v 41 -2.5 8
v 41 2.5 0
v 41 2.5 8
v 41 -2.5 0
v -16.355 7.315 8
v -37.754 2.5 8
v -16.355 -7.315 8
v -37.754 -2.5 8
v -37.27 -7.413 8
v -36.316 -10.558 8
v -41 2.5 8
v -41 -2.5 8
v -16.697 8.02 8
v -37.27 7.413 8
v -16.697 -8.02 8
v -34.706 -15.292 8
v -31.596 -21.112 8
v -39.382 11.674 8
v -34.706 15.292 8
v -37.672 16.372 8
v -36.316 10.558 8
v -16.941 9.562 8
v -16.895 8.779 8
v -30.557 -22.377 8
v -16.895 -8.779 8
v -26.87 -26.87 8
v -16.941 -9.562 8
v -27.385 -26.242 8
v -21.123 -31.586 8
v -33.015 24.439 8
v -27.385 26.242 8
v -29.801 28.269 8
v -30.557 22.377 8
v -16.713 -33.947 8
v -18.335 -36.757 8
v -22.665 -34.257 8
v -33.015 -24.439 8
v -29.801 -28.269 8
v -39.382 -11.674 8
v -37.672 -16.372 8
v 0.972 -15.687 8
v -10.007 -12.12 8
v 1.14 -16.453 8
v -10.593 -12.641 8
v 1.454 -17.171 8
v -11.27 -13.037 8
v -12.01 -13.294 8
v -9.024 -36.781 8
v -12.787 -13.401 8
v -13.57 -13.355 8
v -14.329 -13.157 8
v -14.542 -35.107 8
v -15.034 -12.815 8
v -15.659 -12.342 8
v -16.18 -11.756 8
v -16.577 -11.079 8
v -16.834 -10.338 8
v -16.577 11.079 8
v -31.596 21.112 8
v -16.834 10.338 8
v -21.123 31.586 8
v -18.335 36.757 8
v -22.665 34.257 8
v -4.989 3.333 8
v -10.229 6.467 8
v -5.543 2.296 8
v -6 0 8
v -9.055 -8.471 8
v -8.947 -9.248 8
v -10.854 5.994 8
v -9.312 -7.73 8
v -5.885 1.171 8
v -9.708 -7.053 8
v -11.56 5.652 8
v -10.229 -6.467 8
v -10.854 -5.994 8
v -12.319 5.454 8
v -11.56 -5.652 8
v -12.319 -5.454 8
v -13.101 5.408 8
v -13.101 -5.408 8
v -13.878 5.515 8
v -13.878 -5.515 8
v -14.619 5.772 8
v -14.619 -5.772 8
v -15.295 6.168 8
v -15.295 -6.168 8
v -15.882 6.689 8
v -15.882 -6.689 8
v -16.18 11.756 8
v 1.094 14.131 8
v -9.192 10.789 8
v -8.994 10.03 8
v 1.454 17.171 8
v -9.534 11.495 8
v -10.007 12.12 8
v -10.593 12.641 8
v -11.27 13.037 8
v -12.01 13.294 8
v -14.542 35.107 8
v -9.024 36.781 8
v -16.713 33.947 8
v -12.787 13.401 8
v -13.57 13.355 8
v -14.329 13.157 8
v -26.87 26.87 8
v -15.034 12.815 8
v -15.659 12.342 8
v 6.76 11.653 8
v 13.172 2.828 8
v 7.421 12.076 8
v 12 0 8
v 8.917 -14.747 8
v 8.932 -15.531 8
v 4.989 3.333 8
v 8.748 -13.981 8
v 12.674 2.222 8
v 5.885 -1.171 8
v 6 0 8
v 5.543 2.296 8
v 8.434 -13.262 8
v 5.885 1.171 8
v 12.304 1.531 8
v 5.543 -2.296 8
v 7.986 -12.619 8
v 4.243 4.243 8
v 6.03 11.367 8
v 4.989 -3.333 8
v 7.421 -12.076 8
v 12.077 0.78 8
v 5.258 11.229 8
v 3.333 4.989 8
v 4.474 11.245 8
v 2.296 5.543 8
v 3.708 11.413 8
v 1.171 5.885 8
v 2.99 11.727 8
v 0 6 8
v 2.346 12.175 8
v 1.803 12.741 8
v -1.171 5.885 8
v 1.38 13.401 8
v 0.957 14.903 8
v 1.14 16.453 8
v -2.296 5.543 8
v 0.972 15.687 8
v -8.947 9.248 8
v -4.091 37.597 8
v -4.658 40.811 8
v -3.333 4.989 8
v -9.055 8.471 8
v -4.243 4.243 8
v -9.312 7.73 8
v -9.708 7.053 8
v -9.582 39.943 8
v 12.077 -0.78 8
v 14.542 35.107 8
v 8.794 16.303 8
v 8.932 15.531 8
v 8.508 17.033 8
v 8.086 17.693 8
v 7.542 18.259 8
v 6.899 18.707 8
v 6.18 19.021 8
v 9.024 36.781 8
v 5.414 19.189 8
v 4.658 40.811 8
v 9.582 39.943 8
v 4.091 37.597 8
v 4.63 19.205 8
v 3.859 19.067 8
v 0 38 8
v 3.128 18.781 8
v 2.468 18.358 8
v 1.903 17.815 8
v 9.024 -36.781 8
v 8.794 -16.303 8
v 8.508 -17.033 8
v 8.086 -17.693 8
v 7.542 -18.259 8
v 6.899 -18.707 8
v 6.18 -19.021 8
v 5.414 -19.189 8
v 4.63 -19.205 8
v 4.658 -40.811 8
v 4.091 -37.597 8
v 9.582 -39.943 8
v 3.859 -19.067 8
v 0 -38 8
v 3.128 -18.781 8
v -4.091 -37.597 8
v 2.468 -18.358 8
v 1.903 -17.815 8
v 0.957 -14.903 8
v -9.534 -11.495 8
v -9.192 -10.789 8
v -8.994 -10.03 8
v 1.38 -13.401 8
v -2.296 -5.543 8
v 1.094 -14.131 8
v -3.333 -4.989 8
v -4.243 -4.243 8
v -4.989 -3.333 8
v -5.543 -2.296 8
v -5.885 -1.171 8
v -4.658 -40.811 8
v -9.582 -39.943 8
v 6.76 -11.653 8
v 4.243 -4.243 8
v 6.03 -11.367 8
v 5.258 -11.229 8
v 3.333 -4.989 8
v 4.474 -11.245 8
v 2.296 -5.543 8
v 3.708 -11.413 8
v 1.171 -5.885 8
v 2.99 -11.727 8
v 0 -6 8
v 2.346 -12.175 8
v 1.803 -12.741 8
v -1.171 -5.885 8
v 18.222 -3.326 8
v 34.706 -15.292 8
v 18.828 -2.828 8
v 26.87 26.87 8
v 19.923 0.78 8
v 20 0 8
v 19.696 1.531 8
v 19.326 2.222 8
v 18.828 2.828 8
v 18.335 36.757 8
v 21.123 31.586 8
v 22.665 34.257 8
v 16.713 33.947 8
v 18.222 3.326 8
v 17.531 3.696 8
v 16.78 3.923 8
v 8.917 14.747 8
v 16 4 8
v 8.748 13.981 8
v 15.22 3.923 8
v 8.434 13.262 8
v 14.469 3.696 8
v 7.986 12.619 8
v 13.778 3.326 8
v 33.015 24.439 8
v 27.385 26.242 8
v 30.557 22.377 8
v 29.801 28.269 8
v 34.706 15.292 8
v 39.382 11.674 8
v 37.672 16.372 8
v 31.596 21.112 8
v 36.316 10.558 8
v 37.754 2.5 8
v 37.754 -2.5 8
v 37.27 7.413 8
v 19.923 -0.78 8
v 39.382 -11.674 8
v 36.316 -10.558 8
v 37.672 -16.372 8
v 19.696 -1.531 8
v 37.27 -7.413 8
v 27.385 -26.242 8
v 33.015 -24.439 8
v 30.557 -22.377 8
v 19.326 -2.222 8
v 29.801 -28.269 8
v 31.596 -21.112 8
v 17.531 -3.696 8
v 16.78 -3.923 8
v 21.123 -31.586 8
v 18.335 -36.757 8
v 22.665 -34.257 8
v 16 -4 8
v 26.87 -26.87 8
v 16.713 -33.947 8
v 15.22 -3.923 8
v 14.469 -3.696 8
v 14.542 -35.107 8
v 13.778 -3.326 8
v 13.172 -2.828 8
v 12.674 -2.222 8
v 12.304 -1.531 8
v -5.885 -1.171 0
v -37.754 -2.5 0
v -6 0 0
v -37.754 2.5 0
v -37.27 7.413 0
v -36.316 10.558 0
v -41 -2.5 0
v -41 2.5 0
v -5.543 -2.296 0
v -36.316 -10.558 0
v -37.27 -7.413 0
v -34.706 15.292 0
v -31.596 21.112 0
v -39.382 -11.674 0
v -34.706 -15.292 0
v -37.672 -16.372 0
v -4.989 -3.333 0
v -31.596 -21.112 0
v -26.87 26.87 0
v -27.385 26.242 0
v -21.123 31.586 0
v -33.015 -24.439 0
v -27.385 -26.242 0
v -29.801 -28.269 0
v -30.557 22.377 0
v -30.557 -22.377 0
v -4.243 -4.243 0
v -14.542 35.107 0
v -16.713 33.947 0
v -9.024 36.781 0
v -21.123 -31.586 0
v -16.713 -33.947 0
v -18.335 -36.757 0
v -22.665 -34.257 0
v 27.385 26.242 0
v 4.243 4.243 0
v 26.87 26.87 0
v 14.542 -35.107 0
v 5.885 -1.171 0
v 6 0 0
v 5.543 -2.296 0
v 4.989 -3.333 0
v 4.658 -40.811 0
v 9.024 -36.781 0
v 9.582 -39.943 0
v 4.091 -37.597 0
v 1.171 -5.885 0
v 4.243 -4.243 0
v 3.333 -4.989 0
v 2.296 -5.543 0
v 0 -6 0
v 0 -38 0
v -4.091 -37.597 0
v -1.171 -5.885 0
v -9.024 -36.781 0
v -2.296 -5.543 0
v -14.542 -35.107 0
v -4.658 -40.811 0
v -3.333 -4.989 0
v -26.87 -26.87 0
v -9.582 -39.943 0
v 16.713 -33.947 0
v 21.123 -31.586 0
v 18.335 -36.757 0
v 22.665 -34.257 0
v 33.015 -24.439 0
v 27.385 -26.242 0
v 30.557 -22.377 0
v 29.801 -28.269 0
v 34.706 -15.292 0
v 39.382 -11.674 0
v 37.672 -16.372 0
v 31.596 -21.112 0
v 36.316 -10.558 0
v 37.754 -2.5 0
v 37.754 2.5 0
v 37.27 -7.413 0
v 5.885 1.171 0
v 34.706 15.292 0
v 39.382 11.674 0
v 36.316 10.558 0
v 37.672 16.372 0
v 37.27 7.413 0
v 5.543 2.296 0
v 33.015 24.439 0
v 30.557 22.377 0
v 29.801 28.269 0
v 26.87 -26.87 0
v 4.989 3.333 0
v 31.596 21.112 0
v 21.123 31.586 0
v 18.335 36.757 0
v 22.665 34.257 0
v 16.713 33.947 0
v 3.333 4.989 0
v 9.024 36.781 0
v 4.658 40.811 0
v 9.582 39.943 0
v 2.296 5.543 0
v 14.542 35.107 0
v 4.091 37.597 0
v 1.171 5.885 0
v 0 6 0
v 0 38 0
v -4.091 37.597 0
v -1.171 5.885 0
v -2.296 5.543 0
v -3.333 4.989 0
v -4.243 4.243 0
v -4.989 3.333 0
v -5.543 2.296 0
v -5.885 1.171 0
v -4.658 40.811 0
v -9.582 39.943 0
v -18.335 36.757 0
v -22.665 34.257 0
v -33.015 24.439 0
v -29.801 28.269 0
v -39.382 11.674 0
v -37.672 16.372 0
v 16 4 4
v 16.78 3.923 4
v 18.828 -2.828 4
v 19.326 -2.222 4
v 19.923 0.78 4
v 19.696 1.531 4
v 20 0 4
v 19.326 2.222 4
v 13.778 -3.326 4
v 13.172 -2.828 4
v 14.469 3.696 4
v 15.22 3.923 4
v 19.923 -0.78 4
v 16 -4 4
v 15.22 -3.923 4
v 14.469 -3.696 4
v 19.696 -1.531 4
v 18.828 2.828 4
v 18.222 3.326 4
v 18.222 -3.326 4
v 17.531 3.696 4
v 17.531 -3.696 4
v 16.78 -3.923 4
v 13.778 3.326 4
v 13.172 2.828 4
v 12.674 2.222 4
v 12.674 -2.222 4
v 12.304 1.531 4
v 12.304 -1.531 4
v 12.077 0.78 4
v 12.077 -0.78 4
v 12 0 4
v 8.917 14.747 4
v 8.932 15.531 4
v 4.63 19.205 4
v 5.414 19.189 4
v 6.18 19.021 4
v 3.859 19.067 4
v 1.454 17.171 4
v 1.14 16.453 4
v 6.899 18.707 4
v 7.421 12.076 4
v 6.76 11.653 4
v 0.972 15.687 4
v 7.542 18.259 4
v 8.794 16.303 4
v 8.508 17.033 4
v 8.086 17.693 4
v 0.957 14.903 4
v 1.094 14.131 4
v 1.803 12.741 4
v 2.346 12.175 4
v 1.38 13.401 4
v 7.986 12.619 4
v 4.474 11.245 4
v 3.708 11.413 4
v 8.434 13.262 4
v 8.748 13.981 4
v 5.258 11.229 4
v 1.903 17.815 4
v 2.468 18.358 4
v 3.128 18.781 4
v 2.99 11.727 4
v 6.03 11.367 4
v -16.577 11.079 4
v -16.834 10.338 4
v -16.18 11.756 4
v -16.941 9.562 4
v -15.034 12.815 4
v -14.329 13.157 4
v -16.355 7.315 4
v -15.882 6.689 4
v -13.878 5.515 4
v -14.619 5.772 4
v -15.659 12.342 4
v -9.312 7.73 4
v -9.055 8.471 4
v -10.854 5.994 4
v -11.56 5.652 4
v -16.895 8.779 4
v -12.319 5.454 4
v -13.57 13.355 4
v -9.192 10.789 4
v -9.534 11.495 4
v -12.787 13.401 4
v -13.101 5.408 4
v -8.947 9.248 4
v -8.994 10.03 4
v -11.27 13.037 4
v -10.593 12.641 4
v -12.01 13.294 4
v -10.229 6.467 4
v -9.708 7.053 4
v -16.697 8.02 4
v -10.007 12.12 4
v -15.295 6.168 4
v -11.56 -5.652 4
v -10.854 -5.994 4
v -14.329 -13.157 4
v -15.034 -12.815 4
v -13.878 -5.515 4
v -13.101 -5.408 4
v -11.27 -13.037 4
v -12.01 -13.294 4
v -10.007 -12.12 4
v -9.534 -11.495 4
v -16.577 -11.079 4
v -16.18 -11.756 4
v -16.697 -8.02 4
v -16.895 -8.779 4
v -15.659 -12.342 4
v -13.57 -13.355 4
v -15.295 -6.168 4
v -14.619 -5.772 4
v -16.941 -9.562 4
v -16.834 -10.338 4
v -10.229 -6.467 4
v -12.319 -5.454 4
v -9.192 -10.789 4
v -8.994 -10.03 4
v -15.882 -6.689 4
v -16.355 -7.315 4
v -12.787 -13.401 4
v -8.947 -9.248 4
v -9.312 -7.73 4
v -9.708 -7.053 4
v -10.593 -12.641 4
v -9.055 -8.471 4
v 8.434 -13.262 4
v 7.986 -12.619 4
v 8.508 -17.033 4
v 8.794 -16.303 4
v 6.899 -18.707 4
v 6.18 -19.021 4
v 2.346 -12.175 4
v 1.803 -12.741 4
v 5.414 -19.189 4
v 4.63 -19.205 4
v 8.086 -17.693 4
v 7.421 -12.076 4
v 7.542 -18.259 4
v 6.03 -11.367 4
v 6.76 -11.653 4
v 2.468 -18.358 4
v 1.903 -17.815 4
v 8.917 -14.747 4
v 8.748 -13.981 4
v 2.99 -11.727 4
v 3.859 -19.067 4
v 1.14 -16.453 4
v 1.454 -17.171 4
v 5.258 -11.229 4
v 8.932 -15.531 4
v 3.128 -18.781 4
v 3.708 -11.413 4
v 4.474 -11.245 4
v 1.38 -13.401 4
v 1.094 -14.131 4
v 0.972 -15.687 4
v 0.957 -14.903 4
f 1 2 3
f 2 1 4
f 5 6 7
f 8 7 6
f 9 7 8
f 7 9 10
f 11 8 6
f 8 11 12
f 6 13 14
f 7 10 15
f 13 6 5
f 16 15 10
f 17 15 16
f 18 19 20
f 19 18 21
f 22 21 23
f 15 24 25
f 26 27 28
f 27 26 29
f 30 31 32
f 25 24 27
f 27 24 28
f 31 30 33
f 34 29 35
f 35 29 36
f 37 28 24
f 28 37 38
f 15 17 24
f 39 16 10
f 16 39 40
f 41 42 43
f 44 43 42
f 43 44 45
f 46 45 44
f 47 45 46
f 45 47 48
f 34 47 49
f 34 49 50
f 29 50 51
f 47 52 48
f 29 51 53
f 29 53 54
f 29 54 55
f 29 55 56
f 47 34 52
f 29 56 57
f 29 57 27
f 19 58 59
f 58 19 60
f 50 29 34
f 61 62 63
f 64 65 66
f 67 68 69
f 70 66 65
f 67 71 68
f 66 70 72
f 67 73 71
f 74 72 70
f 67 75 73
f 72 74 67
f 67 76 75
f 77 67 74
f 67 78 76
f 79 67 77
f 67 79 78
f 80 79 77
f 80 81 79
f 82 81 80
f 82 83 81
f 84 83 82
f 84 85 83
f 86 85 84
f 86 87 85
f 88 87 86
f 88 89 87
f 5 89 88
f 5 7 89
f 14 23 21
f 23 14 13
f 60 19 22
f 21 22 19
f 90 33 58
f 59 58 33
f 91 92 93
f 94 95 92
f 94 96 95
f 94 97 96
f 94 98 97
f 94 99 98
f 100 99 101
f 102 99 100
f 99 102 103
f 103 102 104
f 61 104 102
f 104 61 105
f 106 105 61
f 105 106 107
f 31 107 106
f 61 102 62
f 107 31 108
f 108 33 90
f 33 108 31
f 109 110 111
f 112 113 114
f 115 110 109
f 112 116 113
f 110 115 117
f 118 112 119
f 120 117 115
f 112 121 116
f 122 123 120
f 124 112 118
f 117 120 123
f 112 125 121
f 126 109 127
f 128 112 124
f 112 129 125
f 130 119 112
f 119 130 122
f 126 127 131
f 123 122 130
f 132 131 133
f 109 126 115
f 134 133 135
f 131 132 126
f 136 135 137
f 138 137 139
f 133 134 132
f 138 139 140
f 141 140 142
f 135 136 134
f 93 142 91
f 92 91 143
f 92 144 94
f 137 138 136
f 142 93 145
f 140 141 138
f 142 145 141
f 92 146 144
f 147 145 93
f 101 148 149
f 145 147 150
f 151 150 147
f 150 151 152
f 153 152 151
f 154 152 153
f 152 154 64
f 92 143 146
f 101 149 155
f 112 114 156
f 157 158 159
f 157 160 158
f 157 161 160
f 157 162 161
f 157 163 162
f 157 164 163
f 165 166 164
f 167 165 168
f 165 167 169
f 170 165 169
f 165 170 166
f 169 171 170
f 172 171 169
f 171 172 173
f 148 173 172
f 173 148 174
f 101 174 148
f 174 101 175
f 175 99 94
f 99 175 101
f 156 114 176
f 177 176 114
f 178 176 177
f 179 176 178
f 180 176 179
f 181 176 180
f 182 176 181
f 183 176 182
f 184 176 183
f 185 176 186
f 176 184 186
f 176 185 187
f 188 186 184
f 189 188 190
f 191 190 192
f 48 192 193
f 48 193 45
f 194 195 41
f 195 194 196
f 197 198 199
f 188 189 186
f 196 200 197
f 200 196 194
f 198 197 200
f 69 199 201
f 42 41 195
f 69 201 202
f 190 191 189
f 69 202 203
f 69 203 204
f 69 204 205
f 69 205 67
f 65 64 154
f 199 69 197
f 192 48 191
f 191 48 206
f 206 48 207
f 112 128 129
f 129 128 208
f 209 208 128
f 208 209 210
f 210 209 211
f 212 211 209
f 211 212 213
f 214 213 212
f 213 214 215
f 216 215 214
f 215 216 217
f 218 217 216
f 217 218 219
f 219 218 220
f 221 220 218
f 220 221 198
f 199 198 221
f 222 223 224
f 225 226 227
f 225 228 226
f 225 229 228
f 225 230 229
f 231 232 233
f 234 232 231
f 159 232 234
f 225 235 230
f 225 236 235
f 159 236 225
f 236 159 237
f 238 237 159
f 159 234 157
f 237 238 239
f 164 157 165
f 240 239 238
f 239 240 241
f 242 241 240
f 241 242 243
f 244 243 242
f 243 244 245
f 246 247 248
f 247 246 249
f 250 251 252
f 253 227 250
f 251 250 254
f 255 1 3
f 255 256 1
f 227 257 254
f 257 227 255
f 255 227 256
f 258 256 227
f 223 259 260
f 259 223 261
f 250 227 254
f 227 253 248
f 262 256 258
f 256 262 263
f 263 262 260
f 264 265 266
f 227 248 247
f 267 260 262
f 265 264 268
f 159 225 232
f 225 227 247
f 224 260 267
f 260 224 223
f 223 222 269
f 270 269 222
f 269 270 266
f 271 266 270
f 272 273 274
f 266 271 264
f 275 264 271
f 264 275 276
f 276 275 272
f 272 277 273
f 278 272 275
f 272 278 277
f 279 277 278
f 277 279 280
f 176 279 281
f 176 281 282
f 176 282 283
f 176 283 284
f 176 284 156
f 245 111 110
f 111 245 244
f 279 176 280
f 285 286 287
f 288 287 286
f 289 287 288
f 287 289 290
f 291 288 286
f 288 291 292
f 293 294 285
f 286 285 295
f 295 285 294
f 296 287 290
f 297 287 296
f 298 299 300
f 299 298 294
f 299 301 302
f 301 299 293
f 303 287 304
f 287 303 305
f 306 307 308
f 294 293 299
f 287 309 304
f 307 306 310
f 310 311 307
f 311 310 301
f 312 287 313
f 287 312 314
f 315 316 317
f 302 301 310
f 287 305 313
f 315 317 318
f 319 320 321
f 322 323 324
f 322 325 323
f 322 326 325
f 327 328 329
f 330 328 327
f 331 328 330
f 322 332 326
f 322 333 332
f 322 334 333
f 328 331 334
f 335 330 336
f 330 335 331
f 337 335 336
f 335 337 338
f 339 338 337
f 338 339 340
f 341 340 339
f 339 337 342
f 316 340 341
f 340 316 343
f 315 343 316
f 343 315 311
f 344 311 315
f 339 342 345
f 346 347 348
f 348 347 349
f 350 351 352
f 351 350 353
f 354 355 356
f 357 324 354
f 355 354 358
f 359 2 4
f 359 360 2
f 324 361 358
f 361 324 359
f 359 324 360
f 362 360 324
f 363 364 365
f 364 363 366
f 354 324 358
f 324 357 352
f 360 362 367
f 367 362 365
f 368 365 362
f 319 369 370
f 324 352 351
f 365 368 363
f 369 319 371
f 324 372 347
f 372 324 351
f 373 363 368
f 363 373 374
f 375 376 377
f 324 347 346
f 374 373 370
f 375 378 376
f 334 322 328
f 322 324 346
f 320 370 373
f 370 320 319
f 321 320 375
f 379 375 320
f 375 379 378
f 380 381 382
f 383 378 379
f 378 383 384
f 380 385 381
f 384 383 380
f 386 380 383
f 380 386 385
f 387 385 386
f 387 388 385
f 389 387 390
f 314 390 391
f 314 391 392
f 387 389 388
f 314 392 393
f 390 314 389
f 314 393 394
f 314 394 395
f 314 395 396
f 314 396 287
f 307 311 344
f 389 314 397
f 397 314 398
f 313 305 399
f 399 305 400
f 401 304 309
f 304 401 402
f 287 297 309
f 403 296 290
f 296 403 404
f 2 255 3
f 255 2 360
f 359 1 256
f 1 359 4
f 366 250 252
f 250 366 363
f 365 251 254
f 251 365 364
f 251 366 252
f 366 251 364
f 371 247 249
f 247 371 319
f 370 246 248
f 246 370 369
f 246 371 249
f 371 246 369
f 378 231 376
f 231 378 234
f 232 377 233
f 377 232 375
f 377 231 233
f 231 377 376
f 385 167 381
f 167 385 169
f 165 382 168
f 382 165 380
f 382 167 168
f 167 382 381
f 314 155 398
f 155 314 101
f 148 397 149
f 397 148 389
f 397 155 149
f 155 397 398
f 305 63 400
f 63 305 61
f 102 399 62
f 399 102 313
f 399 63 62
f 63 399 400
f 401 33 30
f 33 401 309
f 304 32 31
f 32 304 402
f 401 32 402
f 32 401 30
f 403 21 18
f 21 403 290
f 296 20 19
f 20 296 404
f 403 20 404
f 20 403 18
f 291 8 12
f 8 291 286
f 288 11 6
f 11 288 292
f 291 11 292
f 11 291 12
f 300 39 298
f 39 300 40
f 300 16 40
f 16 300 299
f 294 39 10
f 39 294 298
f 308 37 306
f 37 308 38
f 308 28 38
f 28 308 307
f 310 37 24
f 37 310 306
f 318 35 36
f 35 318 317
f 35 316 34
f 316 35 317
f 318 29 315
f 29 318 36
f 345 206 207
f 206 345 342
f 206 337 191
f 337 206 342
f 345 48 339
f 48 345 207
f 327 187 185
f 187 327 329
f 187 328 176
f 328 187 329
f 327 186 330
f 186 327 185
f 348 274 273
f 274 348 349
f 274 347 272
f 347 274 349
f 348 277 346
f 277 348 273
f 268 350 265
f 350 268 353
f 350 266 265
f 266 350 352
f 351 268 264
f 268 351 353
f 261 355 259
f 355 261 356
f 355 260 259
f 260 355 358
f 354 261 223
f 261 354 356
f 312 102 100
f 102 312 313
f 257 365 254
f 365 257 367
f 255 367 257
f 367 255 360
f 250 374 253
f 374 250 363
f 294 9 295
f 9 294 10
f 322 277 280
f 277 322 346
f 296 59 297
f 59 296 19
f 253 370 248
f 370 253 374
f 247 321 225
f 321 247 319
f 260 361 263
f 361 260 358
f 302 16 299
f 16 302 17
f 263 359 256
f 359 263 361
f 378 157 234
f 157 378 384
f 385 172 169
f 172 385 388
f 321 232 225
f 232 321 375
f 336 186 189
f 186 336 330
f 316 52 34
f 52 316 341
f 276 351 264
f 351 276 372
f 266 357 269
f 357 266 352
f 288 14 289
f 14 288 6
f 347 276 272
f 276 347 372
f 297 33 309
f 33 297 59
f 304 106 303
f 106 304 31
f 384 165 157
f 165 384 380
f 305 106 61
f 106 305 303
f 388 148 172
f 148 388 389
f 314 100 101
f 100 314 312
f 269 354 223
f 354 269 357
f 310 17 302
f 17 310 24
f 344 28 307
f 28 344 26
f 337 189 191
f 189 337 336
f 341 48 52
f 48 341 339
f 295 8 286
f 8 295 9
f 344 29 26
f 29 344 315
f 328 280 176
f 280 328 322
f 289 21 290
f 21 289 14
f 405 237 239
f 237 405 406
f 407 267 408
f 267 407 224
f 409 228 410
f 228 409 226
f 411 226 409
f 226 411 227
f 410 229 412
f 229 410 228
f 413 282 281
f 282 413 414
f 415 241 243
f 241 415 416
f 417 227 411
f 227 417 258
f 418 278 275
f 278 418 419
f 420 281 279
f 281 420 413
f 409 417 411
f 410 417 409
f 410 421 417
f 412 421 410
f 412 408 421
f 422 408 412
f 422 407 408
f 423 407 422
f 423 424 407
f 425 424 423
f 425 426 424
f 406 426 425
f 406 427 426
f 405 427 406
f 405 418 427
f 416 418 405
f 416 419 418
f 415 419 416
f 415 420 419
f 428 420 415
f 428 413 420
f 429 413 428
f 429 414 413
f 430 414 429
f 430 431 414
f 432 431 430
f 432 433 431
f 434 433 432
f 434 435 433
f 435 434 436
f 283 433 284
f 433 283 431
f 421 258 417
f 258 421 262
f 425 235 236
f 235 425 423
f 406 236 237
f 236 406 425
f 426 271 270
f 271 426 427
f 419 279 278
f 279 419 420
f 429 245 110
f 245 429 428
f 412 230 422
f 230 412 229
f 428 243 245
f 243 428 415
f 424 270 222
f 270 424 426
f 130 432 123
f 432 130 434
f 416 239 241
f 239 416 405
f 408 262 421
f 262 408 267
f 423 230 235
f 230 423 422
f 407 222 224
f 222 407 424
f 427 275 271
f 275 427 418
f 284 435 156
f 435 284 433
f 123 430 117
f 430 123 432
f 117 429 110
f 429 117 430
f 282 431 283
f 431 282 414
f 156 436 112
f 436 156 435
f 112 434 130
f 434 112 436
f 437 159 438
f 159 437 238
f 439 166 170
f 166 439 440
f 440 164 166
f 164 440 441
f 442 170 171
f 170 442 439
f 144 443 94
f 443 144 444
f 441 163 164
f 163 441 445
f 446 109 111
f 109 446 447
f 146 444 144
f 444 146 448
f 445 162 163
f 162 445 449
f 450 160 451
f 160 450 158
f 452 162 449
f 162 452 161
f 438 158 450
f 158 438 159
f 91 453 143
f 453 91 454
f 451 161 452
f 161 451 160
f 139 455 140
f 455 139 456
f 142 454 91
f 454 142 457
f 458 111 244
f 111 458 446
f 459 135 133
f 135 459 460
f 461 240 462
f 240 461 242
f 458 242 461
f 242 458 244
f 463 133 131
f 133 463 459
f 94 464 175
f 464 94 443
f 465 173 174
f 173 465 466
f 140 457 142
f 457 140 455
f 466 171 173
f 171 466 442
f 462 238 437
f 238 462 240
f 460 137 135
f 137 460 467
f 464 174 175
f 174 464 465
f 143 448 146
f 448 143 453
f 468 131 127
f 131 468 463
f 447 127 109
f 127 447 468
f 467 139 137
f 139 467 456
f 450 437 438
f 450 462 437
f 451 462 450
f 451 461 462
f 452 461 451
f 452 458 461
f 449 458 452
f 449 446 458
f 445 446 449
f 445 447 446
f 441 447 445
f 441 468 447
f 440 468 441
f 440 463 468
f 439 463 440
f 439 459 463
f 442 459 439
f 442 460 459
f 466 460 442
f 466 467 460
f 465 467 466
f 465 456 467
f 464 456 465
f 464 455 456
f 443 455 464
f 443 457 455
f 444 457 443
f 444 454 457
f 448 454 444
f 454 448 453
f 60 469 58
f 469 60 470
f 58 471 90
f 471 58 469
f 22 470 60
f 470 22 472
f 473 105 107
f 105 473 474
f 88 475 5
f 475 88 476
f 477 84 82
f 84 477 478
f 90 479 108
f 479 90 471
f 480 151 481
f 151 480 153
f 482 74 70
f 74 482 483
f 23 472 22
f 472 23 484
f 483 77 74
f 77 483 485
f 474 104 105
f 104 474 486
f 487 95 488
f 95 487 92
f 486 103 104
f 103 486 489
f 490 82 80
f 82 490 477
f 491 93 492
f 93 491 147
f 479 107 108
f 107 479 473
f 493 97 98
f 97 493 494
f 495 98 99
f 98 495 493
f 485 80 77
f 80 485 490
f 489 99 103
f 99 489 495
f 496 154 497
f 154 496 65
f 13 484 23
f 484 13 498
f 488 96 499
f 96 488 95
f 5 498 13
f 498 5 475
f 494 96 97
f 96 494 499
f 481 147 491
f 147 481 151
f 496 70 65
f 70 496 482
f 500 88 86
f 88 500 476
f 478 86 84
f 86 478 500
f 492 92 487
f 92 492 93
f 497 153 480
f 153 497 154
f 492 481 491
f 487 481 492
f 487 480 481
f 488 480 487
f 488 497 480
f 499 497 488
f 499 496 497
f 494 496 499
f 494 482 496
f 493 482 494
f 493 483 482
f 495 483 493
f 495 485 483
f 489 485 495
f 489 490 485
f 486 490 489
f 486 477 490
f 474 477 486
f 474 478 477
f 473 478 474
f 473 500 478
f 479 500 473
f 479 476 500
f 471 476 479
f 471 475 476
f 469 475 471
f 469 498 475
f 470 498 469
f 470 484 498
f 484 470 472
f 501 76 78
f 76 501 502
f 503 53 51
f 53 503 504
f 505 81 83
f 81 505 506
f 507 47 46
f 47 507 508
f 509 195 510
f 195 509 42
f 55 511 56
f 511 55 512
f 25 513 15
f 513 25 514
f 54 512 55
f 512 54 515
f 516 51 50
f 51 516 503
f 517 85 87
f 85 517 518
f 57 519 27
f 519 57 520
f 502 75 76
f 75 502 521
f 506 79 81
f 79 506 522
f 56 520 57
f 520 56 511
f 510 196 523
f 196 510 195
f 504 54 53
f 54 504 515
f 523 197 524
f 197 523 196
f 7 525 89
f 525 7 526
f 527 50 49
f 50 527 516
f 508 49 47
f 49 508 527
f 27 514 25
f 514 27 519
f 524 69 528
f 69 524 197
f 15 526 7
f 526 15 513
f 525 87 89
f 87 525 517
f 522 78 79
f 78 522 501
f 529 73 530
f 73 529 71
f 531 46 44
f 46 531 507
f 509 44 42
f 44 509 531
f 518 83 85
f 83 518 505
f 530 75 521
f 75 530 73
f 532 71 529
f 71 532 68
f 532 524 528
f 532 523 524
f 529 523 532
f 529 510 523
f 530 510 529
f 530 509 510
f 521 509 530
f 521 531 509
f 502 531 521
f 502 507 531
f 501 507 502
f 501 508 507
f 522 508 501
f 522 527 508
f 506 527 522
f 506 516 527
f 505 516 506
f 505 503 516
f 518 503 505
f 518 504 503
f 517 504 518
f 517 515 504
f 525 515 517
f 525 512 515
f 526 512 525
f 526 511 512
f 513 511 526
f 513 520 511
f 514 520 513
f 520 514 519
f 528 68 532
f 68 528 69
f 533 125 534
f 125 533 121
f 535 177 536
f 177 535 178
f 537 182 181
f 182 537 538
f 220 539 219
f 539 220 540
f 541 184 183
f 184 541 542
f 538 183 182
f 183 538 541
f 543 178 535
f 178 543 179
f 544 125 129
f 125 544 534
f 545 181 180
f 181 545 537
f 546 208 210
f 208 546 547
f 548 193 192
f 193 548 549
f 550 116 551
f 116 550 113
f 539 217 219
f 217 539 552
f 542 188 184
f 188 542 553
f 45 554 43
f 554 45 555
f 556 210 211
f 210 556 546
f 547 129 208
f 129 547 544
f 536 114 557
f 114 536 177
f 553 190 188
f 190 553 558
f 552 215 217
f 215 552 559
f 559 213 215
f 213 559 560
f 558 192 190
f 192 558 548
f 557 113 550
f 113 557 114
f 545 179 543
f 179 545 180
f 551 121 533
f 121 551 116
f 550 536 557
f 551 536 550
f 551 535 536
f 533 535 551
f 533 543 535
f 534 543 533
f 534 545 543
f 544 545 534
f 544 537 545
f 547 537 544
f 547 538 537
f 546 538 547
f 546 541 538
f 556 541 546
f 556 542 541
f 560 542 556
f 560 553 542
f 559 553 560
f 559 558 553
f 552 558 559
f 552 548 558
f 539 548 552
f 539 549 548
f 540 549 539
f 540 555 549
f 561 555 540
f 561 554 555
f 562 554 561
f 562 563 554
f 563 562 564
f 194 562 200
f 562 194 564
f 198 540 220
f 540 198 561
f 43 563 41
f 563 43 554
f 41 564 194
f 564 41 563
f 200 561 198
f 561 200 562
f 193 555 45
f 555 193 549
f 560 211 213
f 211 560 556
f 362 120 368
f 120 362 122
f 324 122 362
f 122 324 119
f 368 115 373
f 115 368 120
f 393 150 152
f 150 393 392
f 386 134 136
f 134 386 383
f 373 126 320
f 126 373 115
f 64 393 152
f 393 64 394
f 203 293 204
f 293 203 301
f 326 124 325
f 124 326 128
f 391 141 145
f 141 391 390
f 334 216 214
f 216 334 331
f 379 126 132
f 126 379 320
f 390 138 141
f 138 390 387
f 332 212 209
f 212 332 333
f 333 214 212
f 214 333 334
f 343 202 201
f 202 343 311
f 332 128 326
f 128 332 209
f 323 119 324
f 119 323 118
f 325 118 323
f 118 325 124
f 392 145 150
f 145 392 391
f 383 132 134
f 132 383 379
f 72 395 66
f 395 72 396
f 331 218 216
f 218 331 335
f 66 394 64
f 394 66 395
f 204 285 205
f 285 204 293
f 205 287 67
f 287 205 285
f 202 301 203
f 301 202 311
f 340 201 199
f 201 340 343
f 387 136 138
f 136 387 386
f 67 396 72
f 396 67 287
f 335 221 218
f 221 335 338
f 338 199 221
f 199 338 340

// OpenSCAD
$fn = 32;

// ----------------------------------------------------------------------
// Spur blank: lightened gear blank
// ----------------------------------------------------------------------

// --- parameters (mm) ---
disc_r = 38;              // blank root radius
disc_t = 8;               // blank thickness
n_teeth = 18;             // stub tooth count
tooth_w = 5;              // tooth width at the root
tooth_h = 3;              // tooth height above the root
bore_r = 6;               // central bore radius
ring_r = 16;              // lightening pocket ring radius
pocket_r = 4;             // lightening pocket radius

out_r = disc_r + tooth_h;  // tip radius
bbox_x = 82.0;  // measured width over the teeth
bbox_y = 81.62;  // measured depth over the teeth

difference() {
union() {
  cylinder(r = disc_r, h = disc_t);
  for (i = [0 : n_teeth - 1])
    rotate([0, 0, i * 360 / n_teeth])
      translate([disc_r - 1, -tooth_w / 2, 0])
        cube([tooth_h + 1, tooth_w, disc_t]);
}
  translate([0, 0, -1]) cylinder(r = bore_r, h = disc_t + 2);
  for (i = [0 : 5])
    rotate([0, 0, i * 72])
      translate([ring_r, 0, disc_t - 4])
        cylinder(r = pocket_r, h = 5);
}
